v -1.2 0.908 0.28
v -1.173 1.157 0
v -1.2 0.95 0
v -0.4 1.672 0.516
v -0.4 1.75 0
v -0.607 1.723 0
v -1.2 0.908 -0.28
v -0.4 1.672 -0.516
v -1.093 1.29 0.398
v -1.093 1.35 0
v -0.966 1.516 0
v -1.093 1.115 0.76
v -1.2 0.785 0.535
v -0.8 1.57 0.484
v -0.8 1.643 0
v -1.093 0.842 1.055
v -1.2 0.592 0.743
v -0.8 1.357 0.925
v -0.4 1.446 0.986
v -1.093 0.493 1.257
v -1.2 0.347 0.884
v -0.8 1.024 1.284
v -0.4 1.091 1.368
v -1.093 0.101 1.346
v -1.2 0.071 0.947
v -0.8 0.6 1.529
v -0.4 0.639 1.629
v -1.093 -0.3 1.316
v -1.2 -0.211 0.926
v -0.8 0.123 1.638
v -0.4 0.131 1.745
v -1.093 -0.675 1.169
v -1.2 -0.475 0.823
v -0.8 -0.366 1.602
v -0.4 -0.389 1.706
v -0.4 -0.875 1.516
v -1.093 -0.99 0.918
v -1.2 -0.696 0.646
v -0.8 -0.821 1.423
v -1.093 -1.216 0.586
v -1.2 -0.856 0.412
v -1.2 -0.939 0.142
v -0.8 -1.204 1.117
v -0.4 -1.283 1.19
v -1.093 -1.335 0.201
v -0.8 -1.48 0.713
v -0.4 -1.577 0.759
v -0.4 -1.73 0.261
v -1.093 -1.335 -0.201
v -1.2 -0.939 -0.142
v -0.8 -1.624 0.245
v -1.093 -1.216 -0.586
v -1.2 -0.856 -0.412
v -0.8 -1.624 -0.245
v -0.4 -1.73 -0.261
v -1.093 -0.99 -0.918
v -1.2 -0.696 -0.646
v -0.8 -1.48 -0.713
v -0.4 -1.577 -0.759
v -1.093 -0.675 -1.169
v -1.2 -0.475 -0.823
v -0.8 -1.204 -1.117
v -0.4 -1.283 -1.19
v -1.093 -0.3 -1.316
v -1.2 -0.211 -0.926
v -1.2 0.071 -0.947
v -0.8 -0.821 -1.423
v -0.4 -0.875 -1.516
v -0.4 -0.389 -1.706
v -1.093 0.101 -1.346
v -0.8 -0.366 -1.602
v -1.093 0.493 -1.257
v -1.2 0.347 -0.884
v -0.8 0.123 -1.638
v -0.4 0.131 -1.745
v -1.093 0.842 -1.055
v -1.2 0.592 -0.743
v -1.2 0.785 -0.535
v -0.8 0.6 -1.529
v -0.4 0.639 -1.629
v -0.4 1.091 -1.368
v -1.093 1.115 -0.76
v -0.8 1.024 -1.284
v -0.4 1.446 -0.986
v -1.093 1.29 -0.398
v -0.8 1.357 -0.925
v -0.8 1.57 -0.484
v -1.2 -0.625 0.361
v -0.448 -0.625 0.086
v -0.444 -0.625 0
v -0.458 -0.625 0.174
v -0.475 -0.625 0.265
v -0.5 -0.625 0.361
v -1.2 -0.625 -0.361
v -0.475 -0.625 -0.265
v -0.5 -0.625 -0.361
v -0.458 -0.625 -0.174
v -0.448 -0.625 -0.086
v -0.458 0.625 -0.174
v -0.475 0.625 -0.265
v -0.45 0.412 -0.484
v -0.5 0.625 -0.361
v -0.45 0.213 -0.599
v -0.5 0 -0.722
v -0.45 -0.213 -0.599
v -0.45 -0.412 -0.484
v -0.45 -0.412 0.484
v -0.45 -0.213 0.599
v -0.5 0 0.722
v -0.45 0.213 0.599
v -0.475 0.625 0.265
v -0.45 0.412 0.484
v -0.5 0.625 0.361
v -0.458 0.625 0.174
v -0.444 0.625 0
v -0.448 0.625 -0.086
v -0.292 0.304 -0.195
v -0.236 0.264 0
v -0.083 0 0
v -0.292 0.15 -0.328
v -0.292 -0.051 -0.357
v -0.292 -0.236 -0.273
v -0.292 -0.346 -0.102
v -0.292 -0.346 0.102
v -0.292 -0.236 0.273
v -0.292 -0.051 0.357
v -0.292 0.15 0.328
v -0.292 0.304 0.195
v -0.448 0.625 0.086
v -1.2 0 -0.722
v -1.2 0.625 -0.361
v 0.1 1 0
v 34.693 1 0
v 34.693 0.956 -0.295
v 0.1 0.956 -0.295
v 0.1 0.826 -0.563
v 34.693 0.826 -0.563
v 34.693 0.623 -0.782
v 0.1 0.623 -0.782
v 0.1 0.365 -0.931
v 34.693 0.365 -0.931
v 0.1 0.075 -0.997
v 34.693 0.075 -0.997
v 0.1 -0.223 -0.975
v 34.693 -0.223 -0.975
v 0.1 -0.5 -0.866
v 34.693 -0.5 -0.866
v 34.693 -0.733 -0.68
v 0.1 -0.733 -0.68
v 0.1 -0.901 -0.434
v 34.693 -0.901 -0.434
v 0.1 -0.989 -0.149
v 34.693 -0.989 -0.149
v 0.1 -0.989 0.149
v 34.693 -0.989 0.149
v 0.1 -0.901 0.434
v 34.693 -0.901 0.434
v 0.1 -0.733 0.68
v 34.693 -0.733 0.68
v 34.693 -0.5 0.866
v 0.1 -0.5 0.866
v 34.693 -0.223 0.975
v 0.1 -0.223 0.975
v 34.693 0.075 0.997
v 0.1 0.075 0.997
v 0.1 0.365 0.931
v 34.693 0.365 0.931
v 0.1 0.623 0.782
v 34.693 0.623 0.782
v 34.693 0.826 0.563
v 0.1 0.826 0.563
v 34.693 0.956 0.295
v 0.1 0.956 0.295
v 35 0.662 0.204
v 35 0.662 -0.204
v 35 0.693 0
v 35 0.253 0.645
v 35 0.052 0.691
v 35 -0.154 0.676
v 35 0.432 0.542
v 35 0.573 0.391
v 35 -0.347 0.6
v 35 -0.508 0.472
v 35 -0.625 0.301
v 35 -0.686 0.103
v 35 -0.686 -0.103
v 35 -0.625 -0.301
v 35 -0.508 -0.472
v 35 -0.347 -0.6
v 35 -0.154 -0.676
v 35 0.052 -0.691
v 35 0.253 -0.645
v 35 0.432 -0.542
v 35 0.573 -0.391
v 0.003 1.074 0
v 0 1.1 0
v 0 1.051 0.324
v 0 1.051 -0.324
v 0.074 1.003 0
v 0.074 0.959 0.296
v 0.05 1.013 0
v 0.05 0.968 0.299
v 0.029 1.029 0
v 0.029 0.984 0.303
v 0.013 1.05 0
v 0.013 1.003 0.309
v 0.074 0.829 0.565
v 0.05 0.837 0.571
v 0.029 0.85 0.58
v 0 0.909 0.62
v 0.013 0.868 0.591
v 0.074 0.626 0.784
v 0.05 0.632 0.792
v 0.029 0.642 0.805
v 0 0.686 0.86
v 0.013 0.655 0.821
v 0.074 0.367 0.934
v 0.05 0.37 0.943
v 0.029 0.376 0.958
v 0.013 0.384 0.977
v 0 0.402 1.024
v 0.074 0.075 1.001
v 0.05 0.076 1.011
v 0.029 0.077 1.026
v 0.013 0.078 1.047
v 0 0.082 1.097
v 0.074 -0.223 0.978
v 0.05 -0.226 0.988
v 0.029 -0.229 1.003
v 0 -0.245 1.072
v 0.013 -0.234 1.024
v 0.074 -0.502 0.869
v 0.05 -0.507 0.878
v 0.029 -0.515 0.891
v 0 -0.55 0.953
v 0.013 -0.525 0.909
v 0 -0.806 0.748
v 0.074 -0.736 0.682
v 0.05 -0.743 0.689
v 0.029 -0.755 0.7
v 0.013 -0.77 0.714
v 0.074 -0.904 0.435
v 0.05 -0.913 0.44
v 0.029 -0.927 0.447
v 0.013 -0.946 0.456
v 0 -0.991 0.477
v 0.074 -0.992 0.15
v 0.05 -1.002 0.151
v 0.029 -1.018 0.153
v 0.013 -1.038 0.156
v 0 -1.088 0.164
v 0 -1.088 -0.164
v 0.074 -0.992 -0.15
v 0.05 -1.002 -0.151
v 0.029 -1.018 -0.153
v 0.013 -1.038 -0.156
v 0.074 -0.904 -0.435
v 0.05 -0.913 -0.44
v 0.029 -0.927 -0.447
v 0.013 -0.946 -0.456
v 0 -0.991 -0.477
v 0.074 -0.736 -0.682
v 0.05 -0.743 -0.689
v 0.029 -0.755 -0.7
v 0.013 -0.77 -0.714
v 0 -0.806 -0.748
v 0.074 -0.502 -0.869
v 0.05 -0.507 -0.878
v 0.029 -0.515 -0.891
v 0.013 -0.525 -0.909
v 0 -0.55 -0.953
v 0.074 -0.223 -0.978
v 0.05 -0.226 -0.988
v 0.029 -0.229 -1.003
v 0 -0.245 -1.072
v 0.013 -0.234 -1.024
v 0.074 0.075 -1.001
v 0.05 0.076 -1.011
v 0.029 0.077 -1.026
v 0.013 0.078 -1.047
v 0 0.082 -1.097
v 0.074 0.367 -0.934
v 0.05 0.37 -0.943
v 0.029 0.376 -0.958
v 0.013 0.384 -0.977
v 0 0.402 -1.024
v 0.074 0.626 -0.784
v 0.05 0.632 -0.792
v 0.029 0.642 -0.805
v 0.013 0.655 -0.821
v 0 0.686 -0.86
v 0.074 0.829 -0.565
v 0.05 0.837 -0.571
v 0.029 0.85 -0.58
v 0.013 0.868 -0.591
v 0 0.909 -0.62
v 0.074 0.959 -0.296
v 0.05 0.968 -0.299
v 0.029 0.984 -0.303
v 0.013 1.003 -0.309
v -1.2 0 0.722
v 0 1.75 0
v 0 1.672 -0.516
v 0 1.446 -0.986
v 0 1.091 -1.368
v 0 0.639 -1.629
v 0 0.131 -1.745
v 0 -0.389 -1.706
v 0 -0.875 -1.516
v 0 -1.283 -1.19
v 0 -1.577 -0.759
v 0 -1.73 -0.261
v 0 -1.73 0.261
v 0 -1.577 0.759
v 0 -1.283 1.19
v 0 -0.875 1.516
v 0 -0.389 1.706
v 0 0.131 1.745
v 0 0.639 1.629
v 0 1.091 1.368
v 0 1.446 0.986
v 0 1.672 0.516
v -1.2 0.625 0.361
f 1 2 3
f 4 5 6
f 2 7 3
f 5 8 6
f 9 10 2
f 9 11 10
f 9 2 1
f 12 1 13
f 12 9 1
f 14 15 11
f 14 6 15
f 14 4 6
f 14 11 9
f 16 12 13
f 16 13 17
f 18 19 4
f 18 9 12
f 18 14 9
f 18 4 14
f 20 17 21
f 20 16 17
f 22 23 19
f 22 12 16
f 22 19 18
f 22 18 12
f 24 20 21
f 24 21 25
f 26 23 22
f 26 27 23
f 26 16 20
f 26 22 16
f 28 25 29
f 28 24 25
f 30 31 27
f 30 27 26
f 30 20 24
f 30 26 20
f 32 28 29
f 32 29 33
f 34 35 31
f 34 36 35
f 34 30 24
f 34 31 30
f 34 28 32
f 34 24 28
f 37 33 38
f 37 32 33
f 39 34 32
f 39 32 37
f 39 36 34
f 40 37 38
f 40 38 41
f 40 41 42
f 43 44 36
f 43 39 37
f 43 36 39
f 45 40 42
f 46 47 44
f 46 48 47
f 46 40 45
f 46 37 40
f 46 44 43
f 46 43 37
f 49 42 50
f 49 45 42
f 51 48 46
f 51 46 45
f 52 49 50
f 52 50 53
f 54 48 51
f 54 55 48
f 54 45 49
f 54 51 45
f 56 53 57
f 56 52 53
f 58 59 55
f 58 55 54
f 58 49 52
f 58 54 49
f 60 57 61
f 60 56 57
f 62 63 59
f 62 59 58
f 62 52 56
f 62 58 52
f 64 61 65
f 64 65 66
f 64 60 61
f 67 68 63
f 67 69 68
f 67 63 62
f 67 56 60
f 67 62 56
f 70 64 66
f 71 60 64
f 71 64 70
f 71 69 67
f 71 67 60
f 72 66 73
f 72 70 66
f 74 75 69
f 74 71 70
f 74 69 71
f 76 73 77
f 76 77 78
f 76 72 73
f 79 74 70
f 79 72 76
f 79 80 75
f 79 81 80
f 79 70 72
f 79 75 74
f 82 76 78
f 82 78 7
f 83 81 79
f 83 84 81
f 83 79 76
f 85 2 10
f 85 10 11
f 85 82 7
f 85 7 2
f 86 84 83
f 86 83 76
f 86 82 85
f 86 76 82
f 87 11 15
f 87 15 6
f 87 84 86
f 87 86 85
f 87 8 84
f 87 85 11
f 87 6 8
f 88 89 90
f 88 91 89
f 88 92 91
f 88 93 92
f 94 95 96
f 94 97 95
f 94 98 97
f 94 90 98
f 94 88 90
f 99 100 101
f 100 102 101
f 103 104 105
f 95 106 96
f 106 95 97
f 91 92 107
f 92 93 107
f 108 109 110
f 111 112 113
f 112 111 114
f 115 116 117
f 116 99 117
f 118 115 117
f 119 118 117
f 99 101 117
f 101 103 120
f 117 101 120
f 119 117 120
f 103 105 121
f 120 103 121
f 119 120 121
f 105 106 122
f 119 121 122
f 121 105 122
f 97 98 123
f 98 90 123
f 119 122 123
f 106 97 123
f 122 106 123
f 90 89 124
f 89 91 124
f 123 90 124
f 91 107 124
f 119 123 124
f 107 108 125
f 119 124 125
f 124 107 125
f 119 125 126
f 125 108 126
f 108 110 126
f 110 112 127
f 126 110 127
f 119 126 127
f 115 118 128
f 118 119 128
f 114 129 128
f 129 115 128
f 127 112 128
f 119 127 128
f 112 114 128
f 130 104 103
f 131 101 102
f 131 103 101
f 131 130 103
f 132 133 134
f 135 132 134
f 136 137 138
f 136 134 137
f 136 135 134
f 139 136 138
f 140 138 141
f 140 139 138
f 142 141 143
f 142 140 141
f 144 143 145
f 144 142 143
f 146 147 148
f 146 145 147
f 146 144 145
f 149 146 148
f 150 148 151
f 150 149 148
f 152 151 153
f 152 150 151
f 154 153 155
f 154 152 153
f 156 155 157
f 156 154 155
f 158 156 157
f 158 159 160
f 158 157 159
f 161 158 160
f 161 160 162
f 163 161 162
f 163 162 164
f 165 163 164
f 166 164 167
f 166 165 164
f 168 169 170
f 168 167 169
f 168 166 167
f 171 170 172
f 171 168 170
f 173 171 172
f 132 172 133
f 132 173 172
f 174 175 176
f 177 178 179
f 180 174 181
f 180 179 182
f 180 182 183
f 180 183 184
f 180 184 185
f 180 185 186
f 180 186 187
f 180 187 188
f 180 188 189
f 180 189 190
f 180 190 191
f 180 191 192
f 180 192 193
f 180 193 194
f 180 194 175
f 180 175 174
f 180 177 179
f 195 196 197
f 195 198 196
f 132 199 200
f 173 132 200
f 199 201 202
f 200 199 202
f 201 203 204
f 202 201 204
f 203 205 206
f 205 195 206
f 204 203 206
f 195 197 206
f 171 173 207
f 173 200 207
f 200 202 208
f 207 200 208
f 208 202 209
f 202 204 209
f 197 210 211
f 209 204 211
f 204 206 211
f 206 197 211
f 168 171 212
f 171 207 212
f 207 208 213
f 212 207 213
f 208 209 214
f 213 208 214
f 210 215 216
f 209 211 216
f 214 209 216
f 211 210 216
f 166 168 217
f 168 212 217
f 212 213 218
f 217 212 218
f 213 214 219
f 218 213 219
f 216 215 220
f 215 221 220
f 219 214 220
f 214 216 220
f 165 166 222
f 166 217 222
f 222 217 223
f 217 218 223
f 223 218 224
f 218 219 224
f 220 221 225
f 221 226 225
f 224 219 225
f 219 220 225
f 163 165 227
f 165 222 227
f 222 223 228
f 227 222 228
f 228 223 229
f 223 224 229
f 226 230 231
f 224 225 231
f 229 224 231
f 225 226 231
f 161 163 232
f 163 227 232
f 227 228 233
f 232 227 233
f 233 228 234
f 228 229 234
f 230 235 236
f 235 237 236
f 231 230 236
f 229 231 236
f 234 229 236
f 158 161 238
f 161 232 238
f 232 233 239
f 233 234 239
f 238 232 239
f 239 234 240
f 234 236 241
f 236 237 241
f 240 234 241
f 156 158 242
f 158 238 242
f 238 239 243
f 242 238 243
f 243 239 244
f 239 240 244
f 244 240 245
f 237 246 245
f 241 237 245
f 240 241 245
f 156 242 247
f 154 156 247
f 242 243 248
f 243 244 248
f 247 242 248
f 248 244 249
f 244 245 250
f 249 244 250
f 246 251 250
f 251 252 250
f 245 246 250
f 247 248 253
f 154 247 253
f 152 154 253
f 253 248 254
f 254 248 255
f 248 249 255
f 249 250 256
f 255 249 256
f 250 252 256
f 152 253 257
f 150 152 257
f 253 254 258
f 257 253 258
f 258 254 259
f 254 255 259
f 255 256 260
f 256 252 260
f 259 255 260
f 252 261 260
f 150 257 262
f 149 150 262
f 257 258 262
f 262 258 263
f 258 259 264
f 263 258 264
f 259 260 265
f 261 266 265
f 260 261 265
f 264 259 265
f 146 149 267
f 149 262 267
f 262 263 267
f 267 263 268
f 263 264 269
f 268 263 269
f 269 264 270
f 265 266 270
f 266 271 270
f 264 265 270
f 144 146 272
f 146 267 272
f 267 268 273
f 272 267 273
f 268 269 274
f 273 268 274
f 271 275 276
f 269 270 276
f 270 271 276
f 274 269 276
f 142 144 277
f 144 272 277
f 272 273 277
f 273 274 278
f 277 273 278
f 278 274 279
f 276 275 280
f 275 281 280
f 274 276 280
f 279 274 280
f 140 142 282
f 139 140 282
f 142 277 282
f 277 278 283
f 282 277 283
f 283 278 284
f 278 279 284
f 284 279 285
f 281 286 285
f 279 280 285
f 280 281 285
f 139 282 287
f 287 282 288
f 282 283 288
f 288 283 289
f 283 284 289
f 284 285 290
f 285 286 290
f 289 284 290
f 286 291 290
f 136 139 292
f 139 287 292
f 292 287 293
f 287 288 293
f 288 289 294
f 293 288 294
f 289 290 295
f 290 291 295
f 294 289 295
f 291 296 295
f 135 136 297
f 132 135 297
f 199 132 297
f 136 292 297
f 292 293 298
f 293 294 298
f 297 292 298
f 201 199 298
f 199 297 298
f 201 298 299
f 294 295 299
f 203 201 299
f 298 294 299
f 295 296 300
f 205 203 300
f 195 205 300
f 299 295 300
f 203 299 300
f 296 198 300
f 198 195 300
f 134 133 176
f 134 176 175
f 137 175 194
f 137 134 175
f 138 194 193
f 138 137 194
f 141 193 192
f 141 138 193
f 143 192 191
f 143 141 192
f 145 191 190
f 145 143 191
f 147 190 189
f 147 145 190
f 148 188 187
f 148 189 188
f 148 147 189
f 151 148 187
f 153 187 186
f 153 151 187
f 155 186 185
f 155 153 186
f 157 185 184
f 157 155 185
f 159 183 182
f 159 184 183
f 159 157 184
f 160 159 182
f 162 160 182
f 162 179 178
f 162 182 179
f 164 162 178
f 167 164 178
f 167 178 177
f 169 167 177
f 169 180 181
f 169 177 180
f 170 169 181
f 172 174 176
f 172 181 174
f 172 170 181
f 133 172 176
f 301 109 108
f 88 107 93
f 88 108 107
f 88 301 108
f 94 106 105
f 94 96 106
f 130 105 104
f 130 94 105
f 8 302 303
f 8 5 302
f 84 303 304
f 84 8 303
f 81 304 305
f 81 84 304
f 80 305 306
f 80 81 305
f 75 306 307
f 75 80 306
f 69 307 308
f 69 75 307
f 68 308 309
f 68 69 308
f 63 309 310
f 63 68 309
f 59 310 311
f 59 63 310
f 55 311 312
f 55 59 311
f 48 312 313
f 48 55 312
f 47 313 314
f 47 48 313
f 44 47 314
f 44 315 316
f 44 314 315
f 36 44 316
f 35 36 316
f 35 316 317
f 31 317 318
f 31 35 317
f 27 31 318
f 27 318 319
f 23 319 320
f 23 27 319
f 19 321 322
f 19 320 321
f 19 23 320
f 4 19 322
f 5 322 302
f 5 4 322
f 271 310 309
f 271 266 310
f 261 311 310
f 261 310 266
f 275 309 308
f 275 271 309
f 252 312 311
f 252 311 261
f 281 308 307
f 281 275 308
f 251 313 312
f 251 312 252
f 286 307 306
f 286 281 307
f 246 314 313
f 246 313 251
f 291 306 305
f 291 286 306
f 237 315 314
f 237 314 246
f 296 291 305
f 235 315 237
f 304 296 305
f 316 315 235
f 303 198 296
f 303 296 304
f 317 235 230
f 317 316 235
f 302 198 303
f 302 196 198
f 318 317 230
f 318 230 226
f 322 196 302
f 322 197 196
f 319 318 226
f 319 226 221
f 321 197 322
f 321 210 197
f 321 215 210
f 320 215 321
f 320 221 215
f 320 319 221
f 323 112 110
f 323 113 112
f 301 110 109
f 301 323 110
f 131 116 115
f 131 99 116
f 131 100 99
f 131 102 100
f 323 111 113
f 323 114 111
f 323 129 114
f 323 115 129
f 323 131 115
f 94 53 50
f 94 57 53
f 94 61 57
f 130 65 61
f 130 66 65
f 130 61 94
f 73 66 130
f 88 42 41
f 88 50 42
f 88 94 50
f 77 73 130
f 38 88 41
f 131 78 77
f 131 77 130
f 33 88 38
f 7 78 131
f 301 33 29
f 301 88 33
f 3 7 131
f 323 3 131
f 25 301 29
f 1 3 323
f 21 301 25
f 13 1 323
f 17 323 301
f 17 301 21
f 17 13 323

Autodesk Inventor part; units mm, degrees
ref_plane "YZ Plane" through (0, 0, 0) normal (1, 0, 0) x (0, 1, 0)
ref_plane "XZ Plane" through (0, 0, 0) normal (0, 1, 0) x (-1, 0, 0)
sketch "Sketch1" plane through (0, 0, 0) normal (0, 0, 1) x (1, 0, 0)
  line L0 (-0.0833, 0) -> (35, 0)
  line L1 (35, 0) -> (35, 1)
  line L2 (35, 1) -> (32, 1)
  line L3 (32, 1) -> (31.6932, 1)
  line L4 (31.6932, 1) -> (0, 1)
  line L5 (0, 1) -> (0, 1.75)
  line L6 (0, 1.75) -> (-1.2, 1.75)
  line L7 (-1.2, 1.75) -> (-1.2, 0.7217)
  line L8 (-1.2, 0.7217) -> (-0.5, 0.7217)
  line L9 (-0.5, 0.7217) -> (-0.0833, 0)
  line L10 (-8.44, 0) -> (42.24, 0) projected
  line L11 (0, -0.35) -> (0, 2.1) projected
  line L12 (32, 1) -> (0, 1) construction
  dimension "d1" = 3
  dimension "d2" = 0.3068
  dimension "d3" = 1.2
  dimension "d4" = 0.7
  dimension "d5" = 60
  dimension "d6" = 2
  dimension "d7" = 2
  dimension "d8" = 1.4434
  dimension "d9" = 3.5
  dimension "d26" = 35
revolve "Body" add sketch "Sketch1" angle 360 about axis through (-0.0833, 0, 0) along (1, 0, 0)
sketch "Sketch2" plane through (-1.2, 0, 0) normal (-1, 0, 0) x (0, 0, 1)
  circle A0 centre (0, 0) radius 0.7217 projected
  line L0 (0, -2.45) -> (0, 2.45) projected
  line L1 (-2.45, 0) -> (2.45, 0) projected
  line L2 (0.7217, 0) -> (0.3608, -0.625)
  line L3 (0.3608, -0.625) -> (-0.3608, -0.625)
  line L4 (-0.3608, -0.625) -> (-0.7217, 0)
  line L5 (-0.7217, 0) -> (-0.3608, 0.625)
  line L6 (-0.3608, 0.625) -> (0.3608, 0.625)
  line L7 (0.3608, 0.625) -> (0.7217, 0)
extrude "Slot" add sketch "Sketch2" against normal up to next contours L7 A0 | A0 L2 | L6 L0 A0 | A0 L0 L3 | L0 L6 A0 | A0 L3 L0 | L4 A0 | A0 L5
fillet "Fillet1" radius 0.8 1 edges at (-1.2, -1.75, 0)
chamfer "Chamfer1" distance 0.3067 distance2 0.3067 1 edges at (35, -1, 0) measured on face at (35, 0.3333, 0.4421)
ref_plane "Work Plane1" through (29, 0, 0) normal (0, -1, 0) x (1, 0, 0)
fillet "Fillet2" radius 0.1 1 edges at (0, -1, 0)
thread "Thread2" size "M2x0.4" class "6g" standard "ANSI Metric M Profile" full length
equation "\"d15\" = -0.5 * SPD + 0.5 * GD"
equation "\"d16\" = GUL"
equation "\"GD\" = NND"
equation "\"NLG\" = 6"
equation "\"GEL\" = 4.5"
equation "\"KOD\" = 5.7"
equation "\"KOH\" = 1.65"
equation "\"INTI\" = 1.04"
equation "\"GAL\" = 0.61345 * PTC"
equation "\"GUL\" = 0.61345 * PTC"
equation "\"BDM\" = NND"
equation "\"SW\" = 2"
equation "\"RR\" = 1.45"
equation "\"SPD\" = NND - 1.2269 * PTC"
equation "\"R\" = 0.3"
equation "\"TOA\" = 30deg"
equation "\"GD1\" = THREADDIA - 1.2269 * PTC"
equation "\"THREADDIA\" = 3"
equation "\"PTC\" = 0.5"
equation "\"NND\" = 3"
equation "\"KOH1\" = 0.2"
equation "\"E0\" = 2.303"
properties part number "M2x35 Bolt" material "Stainless Steel"
